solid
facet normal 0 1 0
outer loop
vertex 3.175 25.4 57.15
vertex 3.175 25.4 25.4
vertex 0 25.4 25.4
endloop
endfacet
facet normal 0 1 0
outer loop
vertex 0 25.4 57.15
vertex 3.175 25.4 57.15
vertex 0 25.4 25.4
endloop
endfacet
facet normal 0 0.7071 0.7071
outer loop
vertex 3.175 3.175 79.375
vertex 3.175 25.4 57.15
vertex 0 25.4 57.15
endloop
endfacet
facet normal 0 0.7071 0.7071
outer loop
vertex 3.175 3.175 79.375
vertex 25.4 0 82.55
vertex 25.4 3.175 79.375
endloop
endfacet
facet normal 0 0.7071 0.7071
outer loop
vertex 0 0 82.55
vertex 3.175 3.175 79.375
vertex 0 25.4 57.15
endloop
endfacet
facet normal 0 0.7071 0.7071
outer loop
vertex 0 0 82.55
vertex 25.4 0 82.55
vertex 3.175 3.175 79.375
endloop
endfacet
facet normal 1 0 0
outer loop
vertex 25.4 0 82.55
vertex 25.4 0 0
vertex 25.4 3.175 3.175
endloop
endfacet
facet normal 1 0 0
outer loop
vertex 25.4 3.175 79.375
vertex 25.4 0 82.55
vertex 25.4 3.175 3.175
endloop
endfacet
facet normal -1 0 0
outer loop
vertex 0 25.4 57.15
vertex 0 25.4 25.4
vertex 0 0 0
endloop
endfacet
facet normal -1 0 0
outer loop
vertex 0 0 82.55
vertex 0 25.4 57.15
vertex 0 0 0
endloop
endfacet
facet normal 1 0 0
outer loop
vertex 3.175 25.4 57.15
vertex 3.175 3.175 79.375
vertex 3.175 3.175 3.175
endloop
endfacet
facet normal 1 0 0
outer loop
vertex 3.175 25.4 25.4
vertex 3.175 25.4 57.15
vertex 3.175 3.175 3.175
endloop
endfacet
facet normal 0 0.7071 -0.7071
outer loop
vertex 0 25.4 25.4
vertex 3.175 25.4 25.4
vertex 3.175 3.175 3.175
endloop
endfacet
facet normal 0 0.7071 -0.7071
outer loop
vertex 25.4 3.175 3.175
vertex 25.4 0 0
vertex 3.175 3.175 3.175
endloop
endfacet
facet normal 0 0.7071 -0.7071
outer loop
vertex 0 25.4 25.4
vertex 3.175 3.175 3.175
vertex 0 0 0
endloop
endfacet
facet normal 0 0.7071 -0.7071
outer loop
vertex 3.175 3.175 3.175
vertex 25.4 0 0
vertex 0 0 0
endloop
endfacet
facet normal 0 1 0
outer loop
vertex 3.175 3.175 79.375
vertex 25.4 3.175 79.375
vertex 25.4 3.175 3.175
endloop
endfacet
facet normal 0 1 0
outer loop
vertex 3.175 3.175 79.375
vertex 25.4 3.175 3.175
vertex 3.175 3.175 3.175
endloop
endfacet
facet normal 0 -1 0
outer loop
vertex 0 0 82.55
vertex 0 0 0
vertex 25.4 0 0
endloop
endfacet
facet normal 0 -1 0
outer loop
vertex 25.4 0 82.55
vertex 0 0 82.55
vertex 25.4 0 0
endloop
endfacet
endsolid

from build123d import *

# Parameters (mm, degrees)
BOSS_EXTRUDE1_DEPTH = 82.55
CHAMFER1_SIZE       = 25.4


with BuildPart() as part:
    # Sketch1 → Boss-Extrude1 (new body)
    with BuildSketch(Plane.XY):
        Polygon((0, 25.4), (0, 0), (25.4, 0), (25.4, 3.175), (3.175, 3.175), (3.175, 25.4), align=None)
    extrude(amount=BOSS_EXTRUDE1_DEPTH)

    # Chamfer1
    chamfer1_edges = [part.edges().sort_by_distance(p)[0] for p in [
        (1.5875, 25.4, 0),
        (1.5875, 25.4, 82.55),
    ]]
    chamfer(chamfer1_edges, length=CHAMFER1_SIZE - 0.0001)  # a hair under: the kernel refuses the full size


solid = part.part
